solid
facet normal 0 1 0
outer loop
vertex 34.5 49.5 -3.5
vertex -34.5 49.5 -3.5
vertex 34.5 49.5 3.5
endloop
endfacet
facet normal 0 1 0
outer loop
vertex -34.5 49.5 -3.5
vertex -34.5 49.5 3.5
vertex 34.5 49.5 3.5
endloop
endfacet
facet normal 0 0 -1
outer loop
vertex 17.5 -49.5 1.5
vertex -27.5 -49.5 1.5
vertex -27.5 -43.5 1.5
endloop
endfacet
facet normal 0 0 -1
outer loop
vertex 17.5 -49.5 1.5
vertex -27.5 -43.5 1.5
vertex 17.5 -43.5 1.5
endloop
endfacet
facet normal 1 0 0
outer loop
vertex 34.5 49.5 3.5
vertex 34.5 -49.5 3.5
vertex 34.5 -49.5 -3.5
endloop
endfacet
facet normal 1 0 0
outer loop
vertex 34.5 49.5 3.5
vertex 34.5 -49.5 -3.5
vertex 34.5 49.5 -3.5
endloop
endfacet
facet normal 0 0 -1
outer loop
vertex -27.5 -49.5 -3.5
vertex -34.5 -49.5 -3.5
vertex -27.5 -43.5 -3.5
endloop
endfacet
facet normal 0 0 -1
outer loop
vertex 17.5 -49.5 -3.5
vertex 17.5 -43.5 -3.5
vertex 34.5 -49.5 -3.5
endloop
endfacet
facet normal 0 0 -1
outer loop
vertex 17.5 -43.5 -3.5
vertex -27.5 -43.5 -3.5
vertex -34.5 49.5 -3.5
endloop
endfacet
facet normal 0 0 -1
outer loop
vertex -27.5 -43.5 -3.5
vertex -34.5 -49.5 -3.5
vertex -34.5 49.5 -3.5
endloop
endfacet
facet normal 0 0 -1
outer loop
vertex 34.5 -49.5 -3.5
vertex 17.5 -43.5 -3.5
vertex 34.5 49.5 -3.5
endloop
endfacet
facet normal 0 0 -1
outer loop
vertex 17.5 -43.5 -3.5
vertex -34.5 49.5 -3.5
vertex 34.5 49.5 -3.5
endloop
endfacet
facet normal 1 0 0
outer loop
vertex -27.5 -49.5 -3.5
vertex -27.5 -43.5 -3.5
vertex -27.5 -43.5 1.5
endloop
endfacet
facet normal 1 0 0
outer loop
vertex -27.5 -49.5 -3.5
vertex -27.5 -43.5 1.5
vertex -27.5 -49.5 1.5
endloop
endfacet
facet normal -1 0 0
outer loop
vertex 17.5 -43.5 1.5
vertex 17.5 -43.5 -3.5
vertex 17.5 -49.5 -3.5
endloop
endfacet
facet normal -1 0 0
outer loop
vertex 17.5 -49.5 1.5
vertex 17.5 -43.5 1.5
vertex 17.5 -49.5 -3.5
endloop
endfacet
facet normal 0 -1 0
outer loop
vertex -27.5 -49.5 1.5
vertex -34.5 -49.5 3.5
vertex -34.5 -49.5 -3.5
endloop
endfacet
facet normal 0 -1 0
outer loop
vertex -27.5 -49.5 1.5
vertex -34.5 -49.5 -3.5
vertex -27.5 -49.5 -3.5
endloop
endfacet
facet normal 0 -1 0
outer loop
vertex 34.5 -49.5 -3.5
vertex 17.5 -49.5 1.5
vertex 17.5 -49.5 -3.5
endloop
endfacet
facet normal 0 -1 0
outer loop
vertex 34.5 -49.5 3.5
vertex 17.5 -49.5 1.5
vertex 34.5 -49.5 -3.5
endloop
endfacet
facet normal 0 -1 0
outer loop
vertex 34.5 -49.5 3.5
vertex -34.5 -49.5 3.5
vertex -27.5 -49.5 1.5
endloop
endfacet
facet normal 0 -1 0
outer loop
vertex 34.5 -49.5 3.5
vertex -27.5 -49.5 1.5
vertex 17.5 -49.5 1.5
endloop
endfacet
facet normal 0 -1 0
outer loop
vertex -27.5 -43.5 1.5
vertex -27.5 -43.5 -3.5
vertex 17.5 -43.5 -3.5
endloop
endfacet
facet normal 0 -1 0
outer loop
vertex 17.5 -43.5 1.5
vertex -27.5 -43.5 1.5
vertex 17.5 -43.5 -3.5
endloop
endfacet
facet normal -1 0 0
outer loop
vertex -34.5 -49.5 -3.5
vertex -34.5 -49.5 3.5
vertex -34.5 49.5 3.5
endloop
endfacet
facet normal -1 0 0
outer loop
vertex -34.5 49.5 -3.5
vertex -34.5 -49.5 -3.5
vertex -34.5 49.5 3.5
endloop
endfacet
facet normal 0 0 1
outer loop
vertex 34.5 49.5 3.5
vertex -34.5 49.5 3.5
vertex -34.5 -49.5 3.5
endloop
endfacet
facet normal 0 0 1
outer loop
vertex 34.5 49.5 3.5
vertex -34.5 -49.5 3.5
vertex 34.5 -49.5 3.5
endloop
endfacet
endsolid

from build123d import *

# Parameters (mm, degrees)
F0_W     = 69
F0_H     = 99
F2_DEPTH = 3.5
F1_W     = 45
F1_H     = 6
F3_DEPTH = 5


with BuildPart() as f2:
    # F0 (on Top) → F2 (new body, symmetric)
    with BuildSketch(Plane.XY):
        Rectangle(F0_W, F0_H)
    extrude(amount=F2_DEPTH, both=True)

    # F1 (on face) → F3 (cut)
    with BuildSketch(Plane(origin=(0, 0, -3.5), x_dir=(1, 0, 0), z_dir=(0, 0, -1))):
        with Locations((-5, 46.5)):
            Rectangle(F1_W, F1_H)
    extrude(amount=-F3_DEPTH, mode=Mode.SUBTRACT)


solid = f2.part
